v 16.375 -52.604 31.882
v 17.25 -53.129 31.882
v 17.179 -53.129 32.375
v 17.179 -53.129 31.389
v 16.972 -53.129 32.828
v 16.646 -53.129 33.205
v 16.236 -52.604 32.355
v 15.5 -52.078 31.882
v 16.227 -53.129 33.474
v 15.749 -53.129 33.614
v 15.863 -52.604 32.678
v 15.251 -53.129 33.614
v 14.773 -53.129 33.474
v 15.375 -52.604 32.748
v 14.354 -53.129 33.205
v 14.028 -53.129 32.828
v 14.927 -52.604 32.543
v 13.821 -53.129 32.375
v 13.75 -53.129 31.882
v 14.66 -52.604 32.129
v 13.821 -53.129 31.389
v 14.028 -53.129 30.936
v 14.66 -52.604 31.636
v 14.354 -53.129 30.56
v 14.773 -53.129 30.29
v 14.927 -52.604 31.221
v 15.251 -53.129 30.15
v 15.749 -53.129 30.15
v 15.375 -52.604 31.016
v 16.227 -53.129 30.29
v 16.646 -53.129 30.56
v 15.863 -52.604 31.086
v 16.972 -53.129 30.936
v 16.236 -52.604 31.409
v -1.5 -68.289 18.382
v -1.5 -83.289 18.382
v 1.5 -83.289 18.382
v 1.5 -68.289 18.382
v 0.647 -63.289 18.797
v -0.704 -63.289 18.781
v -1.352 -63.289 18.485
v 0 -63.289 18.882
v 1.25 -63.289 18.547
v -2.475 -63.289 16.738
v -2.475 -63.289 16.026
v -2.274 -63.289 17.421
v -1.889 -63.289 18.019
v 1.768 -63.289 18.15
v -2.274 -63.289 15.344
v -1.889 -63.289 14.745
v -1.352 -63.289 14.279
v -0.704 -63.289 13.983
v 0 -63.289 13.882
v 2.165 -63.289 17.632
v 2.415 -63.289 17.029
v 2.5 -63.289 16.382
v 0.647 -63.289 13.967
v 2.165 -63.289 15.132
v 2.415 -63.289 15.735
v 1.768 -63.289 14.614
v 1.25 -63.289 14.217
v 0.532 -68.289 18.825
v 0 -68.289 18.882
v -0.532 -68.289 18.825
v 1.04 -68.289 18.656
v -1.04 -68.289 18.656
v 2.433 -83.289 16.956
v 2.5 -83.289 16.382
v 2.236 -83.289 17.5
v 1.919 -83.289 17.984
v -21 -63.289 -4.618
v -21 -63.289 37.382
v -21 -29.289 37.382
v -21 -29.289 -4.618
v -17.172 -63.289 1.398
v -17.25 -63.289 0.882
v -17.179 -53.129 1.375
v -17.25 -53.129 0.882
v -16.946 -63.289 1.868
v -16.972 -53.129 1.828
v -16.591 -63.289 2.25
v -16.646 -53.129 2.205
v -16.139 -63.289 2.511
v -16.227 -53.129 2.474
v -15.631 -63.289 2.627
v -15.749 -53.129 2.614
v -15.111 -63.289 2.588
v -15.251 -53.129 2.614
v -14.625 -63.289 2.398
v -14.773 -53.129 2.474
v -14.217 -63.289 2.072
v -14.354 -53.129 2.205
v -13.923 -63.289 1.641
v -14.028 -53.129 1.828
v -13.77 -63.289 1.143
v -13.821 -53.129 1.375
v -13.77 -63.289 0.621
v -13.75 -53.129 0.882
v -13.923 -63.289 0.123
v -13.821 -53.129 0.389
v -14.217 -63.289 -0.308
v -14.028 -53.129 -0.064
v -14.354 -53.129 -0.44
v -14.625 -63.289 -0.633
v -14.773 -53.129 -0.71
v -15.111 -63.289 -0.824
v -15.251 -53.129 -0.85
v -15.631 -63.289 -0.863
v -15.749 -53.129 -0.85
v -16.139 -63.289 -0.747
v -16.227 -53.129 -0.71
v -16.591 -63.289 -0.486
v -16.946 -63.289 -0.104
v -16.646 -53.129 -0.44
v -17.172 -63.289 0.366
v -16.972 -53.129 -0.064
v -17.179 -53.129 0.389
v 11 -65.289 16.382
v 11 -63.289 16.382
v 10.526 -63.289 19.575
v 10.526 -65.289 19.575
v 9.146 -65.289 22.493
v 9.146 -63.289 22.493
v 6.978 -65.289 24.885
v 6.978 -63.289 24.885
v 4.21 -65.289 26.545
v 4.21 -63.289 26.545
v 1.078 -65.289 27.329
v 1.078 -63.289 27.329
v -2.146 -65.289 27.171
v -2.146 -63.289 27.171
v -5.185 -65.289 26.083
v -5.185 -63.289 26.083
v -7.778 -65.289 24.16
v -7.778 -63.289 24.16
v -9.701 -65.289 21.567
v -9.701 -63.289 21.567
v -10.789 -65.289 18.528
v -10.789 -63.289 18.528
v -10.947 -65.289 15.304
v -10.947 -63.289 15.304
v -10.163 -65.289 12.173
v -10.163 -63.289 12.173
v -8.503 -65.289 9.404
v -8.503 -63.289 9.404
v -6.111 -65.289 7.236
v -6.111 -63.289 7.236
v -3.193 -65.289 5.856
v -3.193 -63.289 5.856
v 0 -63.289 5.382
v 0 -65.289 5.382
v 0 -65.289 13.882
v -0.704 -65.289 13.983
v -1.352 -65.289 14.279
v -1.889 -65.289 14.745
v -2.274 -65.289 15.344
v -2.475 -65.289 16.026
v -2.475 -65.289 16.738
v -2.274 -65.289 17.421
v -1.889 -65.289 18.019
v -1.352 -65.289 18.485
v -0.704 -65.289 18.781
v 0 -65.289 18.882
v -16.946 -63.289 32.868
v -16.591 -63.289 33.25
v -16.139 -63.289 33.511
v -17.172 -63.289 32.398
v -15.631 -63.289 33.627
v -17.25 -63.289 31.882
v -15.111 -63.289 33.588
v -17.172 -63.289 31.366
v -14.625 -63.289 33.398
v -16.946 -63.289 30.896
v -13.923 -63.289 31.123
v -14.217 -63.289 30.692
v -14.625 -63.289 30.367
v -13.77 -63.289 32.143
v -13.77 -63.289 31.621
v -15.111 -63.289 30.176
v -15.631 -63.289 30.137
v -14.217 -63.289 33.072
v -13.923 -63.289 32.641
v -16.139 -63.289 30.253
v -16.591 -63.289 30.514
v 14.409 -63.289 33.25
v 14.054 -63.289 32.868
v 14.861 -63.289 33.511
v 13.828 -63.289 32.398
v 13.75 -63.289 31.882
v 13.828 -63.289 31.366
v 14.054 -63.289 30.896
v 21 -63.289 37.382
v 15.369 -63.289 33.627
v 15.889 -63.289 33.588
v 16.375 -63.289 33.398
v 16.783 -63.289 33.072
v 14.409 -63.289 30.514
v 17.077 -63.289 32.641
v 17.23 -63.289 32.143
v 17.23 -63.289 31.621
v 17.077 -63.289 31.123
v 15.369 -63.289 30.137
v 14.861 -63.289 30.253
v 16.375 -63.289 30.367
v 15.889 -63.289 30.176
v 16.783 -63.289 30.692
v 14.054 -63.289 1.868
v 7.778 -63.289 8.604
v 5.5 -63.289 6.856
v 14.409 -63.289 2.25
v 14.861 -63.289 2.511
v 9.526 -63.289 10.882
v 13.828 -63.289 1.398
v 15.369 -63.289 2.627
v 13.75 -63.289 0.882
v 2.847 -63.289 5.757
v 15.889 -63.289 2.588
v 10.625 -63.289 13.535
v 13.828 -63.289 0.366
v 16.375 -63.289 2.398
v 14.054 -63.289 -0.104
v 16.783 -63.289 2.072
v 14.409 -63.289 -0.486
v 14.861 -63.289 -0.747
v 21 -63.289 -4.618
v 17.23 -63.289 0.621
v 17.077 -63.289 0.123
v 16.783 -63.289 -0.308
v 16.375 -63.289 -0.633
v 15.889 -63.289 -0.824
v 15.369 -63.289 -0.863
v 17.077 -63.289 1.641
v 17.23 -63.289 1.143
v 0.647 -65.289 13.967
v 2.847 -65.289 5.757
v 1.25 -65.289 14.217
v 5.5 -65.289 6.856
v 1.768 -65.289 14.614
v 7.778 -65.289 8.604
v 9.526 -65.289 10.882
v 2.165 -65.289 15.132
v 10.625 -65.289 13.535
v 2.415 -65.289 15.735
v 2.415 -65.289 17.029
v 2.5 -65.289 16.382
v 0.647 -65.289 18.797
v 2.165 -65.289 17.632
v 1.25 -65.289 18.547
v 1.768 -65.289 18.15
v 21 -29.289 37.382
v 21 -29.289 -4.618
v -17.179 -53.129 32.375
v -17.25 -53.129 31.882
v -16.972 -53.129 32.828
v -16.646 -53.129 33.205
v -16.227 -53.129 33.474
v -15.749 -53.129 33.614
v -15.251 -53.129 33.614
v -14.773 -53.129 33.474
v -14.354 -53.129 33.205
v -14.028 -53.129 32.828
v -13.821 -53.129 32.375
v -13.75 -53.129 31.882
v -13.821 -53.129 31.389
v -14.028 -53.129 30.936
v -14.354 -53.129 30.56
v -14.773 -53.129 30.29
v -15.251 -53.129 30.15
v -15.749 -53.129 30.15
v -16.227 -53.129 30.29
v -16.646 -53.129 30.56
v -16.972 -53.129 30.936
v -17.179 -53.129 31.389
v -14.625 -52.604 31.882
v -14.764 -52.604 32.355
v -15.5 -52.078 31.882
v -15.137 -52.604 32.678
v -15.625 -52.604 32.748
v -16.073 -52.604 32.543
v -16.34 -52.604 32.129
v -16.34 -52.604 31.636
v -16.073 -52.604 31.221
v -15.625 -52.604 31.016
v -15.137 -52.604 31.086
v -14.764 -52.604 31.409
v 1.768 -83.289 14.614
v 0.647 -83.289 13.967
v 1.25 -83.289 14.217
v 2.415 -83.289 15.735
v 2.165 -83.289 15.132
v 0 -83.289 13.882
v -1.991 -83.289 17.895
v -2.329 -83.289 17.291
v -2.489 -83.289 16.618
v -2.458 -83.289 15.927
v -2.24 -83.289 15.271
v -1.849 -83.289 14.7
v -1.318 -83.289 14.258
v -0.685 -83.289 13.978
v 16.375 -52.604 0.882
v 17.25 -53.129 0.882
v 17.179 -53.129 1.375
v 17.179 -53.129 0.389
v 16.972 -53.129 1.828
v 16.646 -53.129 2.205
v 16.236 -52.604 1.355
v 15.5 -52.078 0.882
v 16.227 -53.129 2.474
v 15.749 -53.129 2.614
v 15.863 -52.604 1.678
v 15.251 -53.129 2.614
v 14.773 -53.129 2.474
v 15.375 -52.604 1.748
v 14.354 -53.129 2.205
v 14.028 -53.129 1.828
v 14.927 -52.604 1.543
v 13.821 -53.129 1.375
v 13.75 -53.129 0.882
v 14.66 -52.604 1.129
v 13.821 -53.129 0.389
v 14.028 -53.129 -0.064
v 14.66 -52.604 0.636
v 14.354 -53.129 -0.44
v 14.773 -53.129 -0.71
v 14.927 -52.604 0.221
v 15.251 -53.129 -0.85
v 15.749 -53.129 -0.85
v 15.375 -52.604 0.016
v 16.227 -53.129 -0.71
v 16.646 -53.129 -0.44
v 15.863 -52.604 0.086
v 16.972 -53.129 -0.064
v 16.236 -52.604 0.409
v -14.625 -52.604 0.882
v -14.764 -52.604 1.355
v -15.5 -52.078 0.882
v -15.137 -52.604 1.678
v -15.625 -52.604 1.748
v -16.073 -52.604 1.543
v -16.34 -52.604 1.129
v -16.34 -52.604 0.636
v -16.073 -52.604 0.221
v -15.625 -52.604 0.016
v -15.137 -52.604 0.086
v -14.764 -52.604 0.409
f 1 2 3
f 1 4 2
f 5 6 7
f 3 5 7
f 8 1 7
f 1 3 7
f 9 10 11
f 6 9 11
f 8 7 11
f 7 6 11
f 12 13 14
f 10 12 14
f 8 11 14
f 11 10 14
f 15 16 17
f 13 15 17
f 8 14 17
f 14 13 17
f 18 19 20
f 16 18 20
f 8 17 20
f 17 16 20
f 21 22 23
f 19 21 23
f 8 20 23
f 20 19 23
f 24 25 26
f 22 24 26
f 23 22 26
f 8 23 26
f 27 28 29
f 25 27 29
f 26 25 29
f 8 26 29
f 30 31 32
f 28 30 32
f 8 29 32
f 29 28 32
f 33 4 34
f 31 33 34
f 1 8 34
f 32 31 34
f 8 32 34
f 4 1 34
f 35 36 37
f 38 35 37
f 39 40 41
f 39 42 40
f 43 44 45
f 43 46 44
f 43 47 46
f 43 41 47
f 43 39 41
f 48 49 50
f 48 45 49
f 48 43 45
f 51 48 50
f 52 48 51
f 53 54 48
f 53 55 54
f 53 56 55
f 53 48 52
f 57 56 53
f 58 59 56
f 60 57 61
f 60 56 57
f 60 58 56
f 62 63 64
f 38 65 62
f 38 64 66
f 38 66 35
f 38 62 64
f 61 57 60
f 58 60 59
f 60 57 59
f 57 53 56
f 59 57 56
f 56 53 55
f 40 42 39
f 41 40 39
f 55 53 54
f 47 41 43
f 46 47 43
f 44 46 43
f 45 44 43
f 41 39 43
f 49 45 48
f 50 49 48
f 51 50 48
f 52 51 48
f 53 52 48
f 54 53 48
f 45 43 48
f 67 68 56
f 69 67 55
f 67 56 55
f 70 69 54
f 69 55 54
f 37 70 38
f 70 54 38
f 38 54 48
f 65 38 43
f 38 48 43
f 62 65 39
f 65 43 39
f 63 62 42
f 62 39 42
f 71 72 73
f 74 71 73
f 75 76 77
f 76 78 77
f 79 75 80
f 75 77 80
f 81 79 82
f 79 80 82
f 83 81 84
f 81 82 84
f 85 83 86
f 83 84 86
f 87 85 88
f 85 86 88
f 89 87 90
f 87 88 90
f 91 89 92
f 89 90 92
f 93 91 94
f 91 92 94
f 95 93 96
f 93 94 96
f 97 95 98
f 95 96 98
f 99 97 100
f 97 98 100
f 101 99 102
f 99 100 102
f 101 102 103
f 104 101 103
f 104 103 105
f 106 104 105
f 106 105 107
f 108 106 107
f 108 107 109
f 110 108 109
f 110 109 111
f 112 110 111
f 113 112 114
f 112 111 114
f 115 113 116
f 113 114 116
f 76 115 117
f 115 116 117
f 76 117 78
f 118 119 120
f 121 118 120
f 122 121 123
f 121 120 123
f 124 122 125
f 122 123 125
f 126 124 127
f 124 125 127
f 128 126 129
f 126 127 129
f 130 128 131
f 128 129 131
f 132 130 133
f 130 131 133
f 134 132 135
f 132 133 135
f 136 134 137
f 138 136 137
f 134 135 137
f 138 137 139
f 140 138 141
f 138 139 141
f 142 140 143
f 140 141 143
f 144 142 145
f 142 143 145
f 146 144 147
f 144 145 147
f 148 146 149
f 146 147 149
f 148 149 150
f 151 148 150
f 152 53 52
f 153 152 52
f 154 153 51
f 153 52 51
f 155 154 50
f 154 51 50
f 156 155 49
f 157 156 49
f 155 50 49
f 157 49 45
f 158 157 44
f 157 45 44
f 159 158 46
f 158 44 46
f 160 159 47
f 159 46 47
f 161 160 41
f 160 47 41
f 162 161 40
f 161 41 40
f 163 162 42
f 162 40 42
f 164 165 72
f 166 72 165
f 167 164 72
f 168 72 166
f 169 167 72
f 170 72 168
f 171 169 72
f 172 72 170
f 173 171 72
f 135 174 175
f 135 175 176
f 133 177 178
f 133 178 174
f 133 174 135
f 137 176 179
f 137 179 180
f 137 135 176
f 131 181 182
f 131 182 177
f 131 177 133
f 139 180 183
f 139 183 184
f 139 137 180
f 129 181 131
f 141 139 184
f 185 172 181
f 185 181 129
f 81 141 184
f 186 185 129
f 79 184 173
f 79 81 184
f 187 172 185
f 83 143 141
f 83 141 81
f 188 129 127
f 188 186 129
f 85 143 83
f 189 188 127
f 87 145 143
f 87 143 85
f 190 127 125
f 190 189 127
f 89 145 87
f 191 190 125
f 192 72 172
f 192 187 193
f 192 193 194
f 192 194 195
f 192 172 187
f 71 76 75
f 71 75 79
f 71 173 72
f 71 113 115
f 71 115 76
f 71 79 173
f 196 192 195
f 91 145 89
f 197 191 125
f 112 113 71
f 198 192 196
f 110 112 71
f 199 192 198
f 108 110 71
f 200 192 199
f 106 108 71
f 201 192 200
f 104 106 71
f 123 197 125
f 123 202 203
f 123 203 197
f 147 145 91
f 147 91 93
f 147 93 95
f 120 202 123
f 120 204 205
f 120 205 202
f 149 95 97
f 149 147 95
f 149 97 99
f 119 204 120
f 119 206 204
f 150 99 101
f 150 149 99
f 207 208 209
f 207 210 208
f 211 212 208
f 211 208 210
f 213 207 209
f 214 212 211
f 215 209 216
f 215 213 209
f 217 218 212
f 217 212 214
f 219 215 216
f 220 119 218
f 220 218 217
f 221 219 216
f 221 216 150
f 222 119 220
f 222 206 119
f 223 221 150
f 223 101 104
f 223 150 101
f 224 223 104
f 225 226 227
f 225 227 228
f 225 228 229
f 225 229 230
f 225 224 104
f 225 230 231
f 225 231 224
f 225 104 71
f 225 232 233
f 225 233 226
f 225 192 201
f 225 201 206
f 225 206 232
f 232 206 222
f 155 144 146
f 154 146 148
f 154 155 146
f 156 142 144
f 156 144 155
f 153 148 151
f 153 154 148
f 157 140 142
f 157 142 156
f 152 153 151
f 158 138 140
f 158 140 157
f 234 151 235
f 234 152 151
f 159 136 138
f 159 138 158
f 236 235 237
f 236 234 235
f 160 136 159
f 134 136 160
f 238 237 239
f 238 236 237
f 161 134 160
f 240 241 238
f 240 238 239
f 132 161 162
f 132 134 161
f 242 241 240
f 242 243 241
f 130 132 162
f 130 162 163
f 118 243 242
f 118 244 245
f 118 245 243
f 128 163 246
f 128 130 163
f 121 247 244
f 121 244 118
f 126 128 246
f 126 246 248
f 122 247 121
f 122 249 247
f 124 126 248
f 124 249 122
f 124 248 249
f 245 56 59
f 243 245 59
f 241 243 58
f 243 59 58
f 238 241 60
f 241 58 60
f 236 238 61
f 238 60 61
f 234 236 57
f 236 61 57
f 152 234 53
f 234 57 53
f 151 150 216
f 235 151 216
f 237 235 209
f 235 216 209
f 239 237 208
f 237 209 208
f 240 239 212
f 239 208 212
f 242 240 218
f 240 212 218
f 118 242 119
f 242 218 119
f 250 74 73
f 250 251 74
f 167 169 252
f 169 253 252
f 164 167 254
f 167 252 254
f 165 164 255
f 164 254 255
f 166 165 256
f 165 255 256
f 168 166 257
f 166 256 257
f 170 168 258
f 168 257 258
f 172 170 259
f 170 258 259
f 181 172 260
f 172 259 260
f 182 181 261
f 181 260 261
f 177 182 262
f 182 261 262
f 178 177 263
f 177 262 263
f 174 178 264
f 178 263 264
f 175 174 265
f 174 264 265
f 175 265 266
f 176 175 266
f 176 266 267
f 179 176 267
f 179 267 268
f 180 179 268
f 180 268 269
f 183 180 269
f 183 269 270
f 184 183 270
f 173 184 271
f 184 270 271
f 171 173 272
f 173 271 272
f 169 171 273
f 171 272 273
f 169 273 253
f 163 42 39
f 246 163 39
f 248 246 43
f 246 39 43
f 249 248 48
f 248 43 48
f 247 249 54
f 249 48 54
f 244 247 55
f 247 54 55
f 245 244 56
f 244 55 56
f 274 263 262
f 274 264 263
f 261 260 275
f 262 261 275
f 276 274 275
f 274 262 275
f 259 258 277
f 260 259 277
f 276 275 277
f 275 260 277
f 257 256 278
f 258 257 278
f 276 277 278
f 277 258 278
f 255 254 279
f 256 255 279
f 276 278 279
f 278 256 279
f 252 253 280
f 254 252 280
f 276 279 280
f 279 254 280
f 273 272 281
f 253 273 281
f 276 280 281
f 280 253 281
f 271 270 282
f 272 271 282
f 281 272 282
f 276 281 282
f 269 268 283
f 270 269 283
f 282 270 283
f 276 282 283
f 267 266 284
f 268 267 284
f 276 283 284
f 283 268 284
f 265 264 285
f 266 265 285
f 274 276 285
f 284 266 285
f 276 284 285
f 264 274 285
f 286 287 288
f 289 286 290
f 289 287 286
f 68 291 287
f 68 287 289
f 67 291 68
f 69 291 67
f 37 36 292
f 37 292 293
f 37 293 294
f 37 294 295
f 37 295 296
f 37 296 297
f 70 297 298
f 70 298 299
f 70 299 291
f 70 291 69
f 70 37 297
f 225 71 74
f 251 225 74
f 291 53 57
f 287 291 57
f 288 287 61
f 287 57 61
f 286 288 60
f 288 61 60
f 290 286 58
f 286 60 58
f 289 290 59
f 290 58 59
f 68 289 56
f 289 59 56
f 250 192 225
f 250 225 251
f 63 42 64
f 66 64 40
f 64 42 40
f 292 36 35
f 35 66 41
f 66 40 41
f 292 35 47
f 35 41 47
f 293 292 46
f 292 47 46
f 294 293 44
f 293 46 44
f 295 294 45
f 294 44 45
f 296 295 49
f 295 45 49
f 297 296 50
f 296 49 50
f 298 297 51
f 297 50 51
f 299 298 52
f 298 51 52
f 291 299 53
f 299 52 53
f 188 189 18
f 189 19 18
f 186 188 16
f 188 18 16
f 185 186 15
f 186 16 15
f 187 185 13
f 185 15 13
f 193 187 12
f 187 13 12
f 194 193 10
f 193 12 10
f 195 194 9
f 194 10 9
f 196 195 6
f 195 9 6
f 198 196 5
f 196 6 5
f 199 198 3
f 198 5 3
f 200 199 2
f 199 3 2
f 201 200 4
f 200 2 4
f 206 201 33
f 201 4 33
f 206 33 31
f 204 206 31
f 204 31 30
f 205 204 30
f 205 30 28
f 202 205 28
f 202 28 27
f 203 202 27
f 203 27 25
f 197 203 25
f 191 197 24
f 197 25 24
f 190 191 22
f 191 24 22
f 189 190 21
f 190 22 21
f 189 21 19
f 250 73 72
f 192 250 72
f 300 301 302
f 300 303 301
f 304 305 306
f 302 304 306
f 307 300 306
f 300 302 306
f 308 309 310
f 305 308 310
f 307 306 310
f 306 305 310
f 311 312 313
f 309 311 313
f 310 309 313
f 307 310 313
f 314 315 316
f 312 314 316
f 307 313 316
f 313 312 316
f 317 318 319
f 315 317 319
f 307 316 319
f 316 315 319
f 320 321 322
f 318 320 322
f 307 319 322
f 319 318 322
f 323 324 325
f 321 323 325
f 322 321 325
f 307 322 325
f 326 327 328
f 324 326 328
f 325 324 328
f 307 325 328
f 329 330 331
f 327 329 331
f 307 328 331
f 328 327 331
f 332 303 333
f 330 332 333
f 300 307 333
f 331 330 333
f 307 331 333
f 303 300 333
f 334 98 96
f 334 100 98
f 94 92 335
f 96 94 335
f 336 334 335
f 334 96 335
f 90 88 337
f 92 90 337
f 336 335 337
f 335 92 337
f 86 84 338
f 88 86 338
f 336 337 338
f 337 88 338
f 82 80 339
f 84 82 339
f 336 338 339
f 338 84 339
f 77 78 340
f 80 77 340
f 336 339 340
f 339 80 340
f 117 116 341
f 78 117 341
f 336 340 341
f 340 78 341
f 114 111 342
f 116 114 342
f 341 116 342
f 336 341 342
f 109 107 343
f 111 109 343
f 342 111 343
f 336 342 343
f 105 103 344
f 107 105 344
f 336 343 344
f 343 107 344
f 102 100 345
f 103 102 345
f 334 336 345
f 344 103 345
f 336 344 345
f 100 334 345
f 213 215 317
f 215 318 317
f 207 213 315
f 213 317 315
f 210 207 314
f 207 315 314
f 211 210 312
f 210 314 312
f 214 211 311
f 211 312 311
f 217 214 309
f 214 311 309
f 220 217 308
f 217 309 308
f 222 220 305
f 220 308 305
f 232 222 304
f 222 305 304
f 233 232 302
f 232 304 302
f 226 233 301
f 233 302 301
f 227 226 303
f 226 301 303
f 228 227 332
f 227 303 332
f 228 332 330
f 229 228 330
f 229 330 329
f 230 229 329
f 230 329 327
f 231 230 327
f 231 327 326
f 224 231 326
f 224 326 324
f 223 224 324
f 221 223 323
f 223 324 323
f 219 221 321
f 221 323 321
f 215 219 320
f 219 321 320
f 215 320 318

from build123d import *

# Parameters (mm, degrees)
F1_DEPTH = 21
F3_DEPTH = 2
F4_DEPTH = 20
F6_DEPTH = 15
F8_D     = 3.5
F8_DEPTH = 10.16
F8_TIP   = 1.0515060833


with BuildPart() as f1:
    # F0 (on Right) → F1 (new body, symmetric)
    with BuildSketch(Plane.YZ):
        Polygon((-29.2894222864, 37.3821025362), (-63.2894222864, 37.3821025362), (-63.2894222864, 27.3821025362), (-63.2894222864, 16.3821025362), (-63.2894222864, 5.3821025362), (-63.2894222864, -4.6178974638), (-29.2894222864, -4.6178974638), (-29.2894222864, 16.3821025362), align=None)
    extrude(amount=F1_DEPTH, both=True)

    # F2 (on face) → F3 (join)
    with BuildSketch(Plane.XZ.offset(63.2894222864)):
        with BuildLine():
            Line((0, 5.3821025362), (0, 13.8821025362))
            ThreePointArc((0, 13.8821025362), (-2.5, 16.3821025362), (0, 18.8821025362))
            Line((0, 18.8821025362), (0, 27.3821025362))
            ThreePointArc((0, 27.3821025362), (-11, 16.3821025362), (0, 5.3821025362))
        make_face()
        with BuildLine():
            ThreePointArc((2.5, 16.3821025362), (1.767766953, 14.6143355832), (0, 13.8821025362))
            Line((0, 13.8821025362), (0, 5.3821025362))
            ThreePointArc((0, 5.3821025362), (7.7781745931, 8.6039279431), (11, 16.3821025362))
            ThreePointArc((11, 16.3821025362), (7.7781745931, 24.1602771292), (0, 27.3821025362))
            Line((0, 27.3821025362), (0, 18.8821025362))
            ThreePointArc((0, 18.8821025362), (1.767766953, 18.1498694891), (2.5, 16.3821025362))
        make_face()
    extrude(amount=F3_DEPTH)

    # F8
    with Locations(Plane.XZ.offset(63.2894222864)):
        with Locations((-15.5, 31.8821025362), (15.5, 31.8821025362), (15.5, 0.8821025362), (-15.5, 0.8821025362)):
            Hole(F8_D / 2, depth=F8_DEPTH)
            with Locations((0, 0, -(F8_DEPTH + F8_TIP / 2))):  # 118° drill point
                Cone(0, F8_D / 2, F8_TIP, mode=Mode.SUBTRACT)


with BuildPart() as f4:
    # F2 (on face) → F4 (new body)
    with BuildSketch(Plane.XZ.offset(63.2894222864)):
        with BuildLine():
            Line((0, 13.8821025362), (0, 16.3821025362))
            Line((0, 16.3821025362), (0, 18.3821025362))
            Line((0, 18.3821025362), (0, 18.8821025362))
            ThreePointArc((0, 18.8821025362), (-2.5, 16.3821025362), (0, 13.8821025362))
        make_face()
        with BuildLine():
            Line((0, 18.3821025362), (0, 16.3821025362))
            Line((0, 16.3821025362), (0, 13.8821025362))
            ThreePointArc((0, 13.8821025362), (1.767766953, 14.6143355832), (2.5, 16.3821025362))
            ThreePointArc((2.5, 16.3821025362), (1.767766953, 18.1498694891), (0, 18.8821025362))
            Line((0, 18.8821025362), (0, 18.3821025362))
        make_face()
    extrude(amount=F4_DEPTH)

    # F5 (on face) → F6 (cut)
    with BuildSketch(Plane.XZ.offset(83.2894222864)):
        with BuildLine():
            ThreePointArc((1.5, 18.3821025362), (0, 18.8821025362), (-1.5, 18.3821025362))
            Line((-1.5, 18.3821025362), (1.5, 18.3821025362))
        make_face()
    extrude(amount=-F6_DEPTH, mode=Mode.SUBTRACT)


solid = Compound([f1.part, f4.part])
